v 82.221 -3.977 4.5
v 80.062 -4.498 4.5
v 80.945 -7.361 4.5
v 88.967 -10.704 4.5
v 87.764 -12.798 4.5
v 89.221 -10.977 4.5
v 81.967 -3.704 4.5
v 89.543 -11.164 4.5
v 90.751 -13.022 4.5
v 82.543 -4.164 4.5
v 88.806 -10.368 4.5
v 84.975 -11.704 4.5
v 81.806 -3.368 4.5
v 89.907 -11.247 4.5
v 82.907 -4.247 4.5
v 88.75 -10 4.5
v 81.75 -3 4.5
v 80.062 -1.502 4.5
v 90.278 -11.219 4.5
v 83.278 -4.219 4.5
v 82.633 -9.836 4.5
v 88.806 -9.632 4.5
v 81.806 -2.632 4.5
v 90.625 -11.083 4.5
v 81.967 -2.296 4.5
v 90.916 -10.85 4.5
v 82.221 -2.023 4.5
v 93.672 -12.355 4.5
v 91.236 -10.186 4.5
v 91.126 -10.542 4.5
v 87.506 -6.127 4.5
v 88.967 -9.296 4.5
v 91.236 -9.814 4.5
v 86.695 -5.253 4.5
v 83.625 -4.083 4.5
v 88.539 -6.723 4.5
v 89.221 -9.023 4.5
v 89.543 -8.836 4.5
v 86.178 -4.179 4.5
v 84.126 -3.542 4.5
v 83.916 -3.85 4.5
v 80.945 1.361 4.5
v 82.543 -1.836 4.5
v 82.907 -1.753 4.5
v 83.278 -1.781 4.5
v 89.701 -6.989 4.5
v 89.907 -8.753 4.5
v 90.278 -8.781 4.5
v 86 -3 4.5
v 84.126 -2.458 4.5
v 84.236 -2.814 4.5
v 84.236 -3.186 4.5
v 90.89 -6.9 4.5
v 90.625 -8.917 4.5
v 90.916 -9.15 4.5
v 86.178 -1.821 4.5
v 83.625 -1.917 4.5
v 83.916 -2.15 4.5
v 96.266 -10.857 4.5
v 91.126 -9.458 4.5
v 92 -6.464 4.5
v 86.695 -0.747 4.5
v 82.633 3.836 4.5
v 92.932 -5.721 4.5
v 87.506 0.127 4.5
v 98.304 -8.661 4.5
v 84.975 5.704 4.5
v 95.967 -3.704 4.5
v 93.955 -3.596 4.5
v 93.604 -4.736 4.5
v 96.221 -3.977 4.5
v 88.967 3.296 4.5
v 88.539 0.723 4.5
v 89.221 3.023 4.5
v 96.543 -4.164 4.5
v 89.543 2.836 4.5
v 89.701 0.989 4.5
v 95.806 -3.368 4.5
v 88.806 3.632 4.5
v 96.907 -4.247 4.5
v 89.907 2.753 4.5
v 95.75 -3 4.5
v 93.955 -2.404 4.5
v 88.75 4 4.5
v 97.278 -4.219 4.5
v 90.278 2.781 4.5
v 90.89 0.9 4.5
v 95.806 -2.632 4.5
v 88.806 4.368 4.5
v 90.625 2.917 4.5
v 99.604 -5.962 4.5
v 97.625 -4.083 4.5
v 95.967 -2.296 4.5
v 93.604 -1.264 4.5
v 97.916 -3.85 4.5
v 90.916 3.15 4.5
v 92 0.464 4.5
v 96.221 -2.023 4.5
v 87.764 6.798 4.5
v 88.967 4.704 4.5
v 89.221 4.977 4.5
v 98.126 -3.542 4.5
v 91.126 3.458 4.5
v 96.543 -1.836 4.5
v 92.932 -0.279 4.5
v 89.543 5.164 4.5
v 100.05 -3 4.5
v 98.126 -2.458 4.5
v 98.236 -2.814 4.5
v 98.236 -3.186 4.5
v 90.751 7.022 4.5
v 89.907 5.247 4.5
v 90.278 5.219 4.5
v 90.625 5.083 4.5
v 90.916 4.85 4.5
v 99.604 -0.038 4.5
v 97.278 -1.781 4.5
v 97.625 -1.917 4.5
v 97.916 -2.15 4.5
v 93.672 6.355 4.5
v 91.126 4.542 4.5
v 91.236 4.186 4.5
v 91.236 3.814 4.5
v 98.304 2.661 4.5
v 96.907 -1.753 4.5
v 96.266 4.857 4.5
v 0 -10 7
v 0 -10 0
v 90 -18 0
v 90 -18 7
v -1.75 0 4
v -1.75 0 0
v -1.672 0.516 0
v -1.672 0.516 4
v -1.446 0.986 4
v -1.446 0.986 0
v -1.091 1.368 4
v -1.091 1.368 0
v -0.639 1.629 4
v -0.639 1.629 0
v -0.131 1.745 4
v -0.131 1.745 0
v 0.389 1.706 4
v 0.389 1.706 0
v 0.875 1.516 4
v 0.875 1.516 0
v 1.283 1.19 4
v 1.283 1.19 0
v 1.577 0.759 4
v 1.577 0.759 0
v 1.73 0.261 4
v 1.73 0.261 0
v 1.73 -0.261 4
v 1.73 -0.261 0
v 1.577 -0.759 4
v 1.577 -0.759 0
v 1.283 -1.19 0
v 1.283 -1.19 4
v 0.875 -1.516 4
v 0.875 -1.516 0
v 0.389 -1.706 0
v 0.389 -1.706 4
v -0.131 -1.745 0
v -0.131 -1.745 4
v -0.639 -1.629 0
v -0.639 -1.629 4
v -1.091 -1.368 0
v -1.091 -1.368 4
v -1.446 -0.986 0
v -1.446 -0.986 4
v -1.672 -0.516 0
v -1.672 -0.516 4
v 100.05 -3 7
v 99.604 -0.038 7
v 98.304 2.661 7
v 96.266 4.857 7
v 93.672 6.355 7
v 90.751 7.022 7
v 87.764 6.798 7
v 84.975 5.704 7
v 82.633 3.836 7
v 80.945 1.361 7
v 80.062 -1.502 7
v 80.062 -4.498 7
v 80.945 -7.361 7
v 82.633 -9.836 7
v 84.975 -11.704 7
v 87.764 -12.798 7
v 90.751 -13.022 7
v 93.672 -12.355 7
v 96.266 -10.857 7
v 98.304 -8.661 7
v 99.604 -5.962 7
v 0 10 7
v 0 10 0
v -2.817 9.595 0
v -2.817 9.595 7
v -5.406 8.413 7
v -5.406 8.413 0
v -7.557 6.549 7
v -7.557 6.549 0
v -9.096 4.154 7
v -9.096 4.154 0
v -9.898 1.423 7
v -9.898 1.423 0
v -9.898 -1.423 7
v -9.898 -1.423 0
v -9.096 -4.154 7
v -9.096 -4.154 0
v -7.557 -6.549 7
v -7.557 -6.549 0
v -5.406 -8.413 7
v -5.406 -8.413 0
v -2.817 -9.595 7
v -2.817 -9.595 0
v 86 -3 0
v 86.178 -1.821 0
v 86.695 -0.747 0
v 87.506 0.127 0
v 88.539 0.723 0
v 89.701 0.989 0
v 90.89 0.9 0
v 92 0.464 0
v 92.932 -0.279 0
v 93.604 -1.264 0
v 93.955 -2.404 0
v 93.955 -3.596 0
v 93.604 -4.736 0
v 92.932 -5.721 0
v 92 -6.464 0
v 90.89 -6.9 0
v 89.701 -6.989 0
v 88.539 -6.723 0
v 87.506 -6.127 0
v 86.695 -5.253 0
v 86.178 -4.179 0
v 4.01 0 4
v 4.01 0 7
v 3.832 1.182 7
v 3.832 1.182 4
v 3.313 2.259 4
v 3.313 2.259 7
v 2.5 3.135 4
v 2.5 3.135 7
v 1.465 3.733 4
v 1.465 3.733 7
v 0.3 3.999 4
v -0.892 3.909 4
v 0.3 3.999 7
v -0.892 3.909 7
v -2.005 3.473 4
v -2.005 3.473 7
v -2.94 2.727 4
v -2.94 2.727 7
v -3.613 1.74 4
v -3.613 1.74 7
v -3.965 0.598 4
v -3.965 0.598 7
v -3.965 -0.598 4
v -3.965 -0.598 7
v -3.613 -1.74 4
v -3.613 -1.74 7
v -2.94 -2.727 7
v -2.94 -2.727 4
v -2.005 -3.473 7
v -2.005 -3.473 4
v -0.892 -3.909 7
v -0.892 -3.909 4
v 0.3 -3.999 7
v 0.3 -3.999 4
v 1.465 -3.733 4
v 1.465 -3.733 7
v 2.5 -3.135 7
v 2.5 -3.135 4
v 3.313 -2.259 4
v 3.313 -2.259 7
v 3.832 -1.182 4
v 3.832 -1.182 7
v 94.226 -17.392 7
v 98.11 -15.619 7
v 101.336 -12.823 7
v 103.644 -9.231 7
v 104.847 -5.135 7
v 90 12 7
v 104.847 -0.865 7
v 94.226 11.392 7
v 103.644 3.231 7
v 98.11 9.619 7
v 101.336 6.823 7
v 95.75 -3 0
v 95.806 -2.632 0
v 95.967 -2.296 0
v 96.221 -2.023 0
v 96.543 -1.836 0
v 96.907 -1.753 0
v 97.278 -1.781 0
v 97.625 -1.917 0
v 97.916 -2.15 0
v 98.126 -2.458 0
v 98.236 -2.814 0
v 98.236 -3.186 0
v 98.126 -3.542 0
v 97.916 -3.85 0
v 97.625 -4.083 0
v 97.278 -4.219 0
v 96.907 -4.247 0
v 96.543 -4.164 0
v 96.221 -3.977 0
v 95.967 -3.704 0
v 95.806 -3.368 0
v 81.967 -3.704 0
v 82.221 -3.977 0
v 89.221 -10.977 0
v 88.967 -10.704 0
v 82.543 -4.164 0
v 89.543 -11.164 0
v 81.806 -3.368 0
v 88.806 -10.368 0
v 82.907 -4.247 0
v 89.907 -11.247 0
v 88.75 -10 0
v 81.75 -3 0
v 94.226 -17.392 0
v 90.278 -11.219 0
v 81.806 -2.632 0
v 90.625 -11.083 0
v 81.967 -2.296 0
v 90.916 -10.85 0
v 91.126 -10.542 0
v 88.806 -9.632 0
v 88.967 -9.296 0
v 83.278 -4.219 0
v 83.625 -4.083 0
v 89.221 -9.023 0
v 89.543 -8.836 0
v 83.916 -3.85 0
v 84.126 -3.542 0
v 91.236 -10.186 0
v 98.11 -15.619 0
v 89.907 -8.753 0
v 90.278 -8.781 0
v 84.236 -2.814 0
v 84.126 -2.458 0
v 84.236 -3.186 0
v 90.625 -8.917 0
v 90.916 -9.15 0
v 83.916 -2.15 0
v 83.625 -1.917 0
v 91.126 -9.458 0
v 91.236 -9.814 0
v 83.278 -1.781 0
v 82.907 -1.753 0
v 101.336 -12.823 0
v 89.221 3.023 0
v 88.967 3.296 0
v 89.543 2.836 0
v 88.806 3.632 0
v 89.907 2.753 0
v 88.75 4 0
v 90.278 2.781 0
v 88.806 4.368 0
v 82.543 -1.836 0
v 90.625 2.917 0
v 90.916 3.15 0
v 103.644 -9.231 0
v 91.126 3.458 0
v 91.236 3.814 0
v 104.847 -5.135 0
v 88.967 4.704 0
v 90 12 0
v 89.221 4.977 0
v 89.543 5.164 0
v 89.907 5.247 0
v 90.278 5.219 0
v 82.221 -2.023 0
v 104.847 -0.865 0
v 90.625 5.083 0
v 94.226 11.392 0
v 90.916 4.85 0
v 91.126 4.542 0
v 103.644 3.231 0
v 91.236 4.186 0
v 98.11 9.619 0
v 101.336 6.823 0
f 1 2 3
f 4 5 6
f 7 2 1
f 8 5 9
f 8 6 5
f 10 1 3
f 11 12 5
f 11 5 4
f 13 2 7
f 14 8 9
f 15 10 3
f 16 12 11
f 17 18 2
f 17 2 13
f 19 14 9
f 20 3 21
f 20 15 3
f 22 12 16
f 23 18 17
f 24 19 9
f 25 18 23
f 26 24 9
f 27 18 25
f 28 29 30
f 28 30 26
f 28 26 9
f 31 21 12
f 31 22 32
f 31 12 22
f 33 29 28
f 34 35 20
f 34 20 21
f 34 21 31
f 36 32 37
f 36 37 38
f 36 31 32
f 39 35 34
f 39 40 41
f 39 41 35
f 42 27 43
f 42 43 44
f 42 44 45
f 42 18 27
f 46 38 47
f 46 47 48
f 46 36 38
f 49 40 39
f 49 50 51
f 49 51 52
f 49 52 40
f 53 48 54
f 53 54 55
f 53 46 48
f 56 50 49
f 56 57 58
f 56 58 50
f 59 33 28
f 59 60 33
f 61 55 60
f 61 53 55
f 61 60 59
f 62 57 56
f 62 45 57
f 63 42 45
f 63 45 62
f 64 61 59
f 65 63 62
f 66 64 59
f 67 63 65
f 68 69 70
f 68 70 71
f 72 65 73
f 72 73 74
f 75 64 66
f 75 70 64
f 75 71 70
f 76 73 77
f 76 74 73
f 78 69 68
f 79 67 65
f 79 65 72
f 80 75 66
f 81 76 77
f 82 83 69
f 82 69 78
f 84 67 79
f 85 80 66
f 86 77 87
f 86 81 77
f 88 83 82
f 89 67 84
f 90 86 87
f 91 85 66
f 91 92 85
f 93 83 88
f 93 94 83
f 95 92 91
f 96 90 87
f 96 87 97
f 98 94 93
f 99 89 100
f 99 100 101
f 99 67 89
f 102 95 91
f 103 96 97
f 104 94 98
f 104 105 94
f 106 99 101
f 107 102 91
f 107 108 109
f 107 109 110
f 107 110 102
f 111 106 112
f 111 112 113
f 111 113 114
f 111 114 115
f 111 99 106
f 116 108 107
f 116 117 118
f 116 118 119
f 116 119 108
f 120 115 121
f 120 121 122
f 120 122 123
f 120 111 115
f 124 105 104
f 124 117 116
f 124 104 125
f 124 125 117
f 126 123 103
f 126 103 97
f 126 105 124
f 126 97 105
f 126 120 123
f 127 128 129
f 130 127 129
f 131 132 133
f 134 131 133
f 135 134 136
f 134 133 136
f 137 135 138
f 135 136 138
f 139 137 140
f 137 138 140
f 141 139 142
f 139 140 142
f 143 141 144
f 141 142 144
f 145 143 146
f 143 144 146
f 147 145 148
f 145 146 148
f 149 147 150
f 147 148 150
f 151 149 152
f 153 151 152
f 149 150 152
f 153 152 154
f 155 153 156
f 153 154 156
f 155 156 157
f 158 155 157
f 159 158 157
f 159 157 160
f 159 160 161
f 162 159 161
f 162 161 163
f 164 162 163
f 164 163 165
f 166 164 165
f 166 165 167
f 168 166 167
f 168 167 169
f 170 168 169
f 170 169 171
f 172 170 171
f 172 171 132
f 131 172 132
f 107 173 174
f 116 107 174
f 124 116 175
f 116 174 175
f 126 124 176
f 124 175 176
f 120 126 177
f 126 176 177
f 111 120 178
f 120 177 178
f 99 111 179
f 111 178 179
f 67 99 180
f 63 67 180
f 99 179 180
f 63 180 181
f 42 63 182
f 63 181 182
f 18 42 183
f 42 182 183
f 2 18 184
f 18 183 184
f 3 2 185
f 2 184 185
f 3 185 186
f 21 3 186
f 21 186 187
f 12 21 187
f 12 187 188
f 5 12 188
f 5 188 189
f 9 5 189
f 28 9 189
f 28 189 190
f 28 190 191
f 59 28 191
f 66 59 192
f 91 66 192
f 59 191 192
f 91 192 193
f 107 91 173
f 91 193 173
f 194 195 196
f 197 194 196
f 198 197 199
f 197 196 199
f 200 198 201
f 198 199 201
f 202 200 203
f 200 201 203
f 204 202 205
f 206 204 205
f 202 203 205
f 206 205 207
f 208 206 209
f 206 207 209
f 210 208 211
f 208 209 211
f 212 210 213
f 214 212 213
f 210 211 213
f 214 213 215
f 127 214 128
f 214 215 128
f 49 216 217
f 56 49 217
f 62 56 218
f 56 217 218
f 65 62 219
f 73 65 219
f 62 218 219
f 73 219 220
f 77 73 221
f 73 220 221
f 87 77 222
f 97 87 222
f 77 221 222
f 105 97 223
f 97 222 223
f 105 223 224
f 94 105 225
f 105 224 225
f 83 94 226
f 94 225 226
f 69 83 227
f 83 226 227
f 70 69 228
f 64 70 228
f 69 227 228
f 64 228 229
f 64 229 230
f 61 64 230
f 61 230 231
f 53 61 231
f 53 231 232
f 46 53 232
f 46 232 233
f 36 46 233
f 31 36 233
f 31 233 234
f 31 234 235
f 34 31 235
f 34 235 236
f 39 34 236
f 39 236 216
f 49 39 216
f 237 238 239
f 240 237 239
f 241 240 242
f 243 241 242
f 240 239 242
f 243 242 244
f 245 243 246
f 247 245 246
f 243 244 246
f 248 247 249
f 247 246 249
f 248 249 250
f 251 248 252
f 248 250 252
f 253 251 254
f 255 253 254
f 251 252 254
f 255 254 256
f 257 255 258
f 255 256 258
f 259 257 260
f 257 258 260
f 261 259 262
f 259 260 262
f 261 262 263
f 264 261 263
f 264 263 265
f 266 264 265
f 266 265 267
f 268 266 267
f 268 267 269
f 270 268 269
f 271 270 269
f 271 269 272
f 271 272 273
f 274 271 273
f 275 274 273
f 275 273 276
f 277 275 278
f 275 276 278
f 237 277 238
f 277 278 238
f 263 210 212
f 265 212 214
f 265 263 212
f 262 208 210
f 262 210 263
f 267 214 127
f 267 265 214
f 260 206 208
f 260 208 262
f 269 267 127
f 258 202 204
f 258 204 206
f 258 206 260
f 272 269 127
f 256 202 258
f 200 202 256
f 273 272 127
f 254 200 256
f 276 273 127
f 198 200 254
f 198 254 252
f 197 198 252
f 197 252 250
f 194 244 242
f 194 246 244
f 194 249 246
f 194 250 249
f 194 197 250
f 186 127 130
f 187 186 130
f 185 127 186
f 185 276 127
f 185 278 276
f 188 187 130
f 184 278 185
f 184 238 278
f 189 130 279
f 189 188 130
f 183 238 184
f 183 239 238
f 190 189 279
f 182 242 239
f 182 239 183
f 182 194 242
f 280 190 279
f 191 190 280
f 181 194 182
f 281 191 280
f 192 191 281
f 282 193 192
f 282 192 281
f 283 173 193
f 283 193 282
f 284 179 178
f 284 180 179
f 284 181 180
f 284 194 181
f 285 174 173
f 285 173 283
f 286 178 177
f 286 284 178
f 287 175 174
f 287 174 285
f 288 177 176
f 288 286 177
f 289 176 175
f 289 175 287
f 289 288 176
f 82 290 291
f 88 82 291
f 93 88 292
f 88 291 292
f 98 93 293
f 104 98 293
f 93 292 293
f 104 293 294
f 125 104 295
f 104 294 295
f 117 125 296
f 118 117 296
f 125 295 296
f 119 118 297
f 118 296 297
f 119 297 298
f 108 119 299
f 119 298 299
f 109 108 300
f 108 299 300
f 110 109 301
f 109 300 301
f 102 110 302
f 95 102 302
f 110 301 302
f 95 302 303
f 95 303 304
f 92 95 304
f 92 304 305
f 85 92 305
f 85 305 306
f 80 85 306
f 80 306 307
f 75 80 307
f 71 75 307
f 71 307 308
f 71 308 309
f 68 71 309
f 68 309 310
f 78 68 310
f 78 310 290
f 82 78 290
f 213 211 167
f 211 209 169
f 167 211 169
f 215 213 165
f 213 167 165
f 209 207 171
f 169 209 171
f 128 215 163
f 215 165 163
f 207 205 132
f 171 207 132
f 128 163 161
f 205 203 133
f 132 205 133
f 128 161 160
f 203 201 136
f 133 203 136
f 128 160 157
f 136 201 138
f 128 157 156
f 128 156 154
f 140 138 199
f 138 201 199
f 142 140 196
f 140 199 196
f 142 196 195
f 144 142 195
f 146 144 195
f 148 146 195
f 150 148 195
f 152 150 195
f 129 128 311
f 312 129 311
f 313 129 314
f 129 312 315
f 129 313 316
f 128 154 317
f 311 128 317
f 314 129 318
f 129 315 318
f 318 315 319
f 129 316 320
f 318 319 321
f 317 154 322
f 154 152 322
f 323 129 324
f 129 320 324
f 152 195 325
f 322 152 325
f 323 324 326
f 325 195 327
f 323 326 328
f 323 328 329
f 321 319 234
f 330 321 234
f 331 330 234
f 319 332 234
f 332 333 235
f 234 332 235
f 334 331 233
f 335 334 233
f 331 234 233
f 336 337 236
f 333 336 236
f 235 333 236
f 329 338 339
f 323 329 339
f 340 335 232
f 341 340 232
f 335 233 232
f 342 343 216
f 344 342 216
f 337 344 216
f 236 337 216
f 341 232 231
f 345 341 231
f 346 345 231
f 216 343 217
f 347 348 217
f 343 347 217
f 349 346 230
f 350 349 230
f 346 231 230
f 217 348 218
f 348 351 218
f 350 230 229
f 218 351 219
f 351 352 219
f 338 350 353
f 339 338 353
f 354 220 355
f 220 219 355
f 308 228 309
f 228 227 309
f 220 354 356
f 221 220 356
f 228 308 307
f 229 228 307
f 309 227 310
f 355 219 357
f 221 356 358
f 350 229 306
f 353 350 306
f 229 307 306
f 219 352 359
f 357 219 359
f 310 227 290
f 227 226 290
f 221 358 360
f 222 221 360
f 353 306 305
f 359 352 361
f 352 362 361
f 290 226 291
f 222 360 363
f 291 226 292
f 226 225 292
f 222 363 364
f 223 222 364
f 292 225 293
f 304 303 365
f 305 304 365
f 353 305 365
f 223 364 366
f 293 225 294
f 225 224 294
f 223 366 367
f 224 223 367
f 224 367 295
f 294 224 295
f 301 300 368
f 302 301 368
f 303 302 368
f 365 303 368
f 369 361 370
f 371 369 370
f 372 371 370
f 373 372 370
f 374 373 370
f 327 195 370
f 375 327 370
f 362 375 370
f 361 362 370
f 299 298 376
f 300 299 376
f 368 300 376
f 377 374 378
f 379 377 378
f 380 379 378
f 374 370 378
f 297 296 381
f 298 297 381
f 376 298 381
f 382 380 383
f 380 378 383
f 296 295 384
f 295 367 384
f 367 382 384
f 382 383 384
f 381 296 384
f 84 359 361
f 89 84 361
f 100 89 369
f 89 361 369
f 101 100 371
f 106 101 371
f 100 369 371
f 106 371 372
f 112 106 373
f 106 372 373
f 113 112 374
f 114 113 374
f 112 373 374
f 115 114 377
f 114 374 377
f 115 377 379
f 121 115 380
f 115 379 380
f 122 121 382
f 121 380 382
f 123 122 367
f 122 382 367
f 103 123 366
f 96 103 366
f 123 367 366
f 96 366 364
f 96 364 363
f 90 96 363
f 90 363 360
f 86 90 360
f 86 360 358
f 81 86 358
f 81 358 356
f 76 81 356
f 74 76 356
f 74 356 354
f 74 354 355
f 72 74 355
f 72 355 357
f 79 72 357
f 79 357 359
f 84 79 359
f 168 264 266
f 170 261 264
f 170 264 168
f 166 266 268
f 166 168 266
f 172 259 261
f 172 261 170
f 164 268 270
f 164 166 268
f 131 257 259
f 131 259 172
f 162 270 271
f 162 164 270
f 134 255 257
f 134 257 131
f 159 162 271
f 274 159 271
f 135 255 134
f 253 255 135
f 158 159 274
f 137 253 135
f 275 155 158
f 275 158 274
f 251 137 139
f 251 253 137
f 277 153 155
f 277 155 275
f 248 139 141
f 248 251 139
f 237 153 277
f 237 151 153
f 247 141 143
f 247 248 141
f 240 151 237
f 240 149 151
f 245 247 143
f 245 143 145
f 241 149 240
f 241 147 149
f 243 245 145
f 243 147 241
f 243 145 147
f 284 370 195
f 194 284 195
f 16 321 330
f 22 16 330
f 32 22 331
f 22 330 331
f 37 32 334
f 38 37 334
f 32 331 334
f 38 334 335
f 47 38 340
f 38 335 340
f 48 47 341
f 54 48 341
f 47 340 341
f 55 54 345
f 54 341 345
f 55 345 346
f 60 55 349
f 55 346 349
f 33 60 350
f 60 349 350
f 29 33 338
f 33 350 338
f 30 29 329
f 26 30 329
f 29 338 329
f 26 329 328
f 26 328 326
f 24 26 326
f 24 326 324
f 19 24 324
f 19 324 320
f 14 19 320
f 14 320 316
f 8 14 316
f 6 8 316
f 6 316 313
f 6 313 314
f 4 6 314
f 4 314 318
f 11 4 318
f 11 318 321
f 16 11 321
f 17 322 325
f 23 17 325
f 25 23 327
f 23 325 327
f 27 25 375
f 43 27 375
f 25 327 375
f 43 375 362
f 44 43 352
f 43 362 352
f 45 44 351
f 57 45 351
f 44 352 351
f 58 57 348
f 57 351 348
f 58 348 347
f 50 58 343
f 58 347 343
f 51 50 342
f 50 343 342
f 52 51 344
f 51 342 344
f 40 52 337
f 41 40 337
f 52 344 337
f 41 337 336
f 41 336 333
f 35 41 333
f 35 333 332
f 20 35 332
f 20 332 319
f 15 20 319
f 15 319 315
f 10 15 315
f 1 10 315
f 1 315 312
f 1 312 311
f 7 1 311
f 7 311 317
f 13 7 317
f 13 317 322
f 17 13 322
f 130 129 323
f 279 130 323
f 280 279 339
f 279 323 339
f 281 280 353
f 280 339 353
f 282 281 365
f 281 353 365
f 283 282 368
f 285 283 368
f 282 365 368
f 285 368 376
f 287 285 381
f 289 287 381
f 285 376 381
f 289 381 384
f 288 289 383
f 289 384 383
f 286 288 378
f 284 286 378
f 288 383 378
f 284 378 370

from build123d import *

# Parameters (mm, degrees)
EXTRUDE_1_DEPTH     = 7
SKETCH_2_R          = 4.1
SKETCH_2_R_2        = 1.25
SKETCH_2_R_3        = 4
CUT_EXTRUDE_1_DEPTH = 10
SKETCH_3_R          = 10.05
CUT_EXTRUDE_2_DEPTH = 2.5
EXTRUDE_START       = -7
SKETCH_4_R          = 4.1
EXTRUDE_5_DEPTH     = 7
SKETCH_6_R          = 4.01
CUT_EXTRUDE_6_DEPTH = 3
SKETCH_8_R          = 1.75
CUT_EXTRUDE_7_DEPTH = 10


with BuildPart() as part:
    # 草图1 → 凸台-拉伸1 (new body)
    with BuildSketch(Plane.XY):
        with BuildLine():
            Line((0, -10), (90, -18))
            ThreePointArc((90, -18), (105, -3), (90, 12))
            Line((90, 12), (0, 10))
            ThreePointArc((0, 10), (-10, 0), (0, -10))
        make_face()
    extrude(amount=EXTRUDE_1_DEPTH)

    # 草图2 → 切除-拉伸1 (cut)
    with BuildSketch(Plane(origin=(0, 0, 0), x_dir=(-1, 0, 0), z_dir=(0, 0, -1))):
        Circle(SKETCH_2_R)
        with Locations((-90, -10)):
            Circle(SKETCH_2_R_2)
        with Locations((-83, -3)):
            Circle(SKETCH_2_R_2)
        with Locations((-90, 4)):
            Circle(SKETCH_2_R_2)
        with Locations((-97, -3)):
            Circle(SKETCH_2_R_2)
        with Locations((-90, -3)):
            Circle(SKETCH_2_R_3)
    extrude(amount=-CUT_EXTRUDE_1_DEPTH, mode=Mode.SUBTRACT)

    # 草图3 → 切除-拉伸2 (cut)
    with BuildSketch(Plane.XY.offset(7)):
        with Locations((90, -3)):
            Circle(SKETCH_3_R)
    extrude(amount=-CUT_EXTRUDE_2_DEPTH, mode=Mode.SUBTRACT)

    # 草图4 → 凸台-拉伸5 (add)
    with BuildSketch(Plane.XY.offset(7).offset(EXTRUDE_START)):
        Circle(SKETCH_4_R)
    extrude(amount=EXTRUDE_5_DEPTH)

    # 草图6 → 切除-拉伸6 (cut)
    with BuildSketch(Plane.XY.offset(7)):
        Circle(SKETCH_6_R)
    extrude(amount=-CUT_EXTRUDE_6_DEPTH, mode=Mode.SUBTRACT)

    # 草图8 → 切除-拉伸7 (cut)
    with BuildSketch(Plane(origin=(0, 0, 0), x_dir=(-1, 0, 0), z_dir=(0, 0, -1))):
        Circle(SKETCH_8_R)
    extrude(amount=-CUT_EXTRUDE_7_DEPTH, mode=Mode.SUBTRACT)


solid = part.part
